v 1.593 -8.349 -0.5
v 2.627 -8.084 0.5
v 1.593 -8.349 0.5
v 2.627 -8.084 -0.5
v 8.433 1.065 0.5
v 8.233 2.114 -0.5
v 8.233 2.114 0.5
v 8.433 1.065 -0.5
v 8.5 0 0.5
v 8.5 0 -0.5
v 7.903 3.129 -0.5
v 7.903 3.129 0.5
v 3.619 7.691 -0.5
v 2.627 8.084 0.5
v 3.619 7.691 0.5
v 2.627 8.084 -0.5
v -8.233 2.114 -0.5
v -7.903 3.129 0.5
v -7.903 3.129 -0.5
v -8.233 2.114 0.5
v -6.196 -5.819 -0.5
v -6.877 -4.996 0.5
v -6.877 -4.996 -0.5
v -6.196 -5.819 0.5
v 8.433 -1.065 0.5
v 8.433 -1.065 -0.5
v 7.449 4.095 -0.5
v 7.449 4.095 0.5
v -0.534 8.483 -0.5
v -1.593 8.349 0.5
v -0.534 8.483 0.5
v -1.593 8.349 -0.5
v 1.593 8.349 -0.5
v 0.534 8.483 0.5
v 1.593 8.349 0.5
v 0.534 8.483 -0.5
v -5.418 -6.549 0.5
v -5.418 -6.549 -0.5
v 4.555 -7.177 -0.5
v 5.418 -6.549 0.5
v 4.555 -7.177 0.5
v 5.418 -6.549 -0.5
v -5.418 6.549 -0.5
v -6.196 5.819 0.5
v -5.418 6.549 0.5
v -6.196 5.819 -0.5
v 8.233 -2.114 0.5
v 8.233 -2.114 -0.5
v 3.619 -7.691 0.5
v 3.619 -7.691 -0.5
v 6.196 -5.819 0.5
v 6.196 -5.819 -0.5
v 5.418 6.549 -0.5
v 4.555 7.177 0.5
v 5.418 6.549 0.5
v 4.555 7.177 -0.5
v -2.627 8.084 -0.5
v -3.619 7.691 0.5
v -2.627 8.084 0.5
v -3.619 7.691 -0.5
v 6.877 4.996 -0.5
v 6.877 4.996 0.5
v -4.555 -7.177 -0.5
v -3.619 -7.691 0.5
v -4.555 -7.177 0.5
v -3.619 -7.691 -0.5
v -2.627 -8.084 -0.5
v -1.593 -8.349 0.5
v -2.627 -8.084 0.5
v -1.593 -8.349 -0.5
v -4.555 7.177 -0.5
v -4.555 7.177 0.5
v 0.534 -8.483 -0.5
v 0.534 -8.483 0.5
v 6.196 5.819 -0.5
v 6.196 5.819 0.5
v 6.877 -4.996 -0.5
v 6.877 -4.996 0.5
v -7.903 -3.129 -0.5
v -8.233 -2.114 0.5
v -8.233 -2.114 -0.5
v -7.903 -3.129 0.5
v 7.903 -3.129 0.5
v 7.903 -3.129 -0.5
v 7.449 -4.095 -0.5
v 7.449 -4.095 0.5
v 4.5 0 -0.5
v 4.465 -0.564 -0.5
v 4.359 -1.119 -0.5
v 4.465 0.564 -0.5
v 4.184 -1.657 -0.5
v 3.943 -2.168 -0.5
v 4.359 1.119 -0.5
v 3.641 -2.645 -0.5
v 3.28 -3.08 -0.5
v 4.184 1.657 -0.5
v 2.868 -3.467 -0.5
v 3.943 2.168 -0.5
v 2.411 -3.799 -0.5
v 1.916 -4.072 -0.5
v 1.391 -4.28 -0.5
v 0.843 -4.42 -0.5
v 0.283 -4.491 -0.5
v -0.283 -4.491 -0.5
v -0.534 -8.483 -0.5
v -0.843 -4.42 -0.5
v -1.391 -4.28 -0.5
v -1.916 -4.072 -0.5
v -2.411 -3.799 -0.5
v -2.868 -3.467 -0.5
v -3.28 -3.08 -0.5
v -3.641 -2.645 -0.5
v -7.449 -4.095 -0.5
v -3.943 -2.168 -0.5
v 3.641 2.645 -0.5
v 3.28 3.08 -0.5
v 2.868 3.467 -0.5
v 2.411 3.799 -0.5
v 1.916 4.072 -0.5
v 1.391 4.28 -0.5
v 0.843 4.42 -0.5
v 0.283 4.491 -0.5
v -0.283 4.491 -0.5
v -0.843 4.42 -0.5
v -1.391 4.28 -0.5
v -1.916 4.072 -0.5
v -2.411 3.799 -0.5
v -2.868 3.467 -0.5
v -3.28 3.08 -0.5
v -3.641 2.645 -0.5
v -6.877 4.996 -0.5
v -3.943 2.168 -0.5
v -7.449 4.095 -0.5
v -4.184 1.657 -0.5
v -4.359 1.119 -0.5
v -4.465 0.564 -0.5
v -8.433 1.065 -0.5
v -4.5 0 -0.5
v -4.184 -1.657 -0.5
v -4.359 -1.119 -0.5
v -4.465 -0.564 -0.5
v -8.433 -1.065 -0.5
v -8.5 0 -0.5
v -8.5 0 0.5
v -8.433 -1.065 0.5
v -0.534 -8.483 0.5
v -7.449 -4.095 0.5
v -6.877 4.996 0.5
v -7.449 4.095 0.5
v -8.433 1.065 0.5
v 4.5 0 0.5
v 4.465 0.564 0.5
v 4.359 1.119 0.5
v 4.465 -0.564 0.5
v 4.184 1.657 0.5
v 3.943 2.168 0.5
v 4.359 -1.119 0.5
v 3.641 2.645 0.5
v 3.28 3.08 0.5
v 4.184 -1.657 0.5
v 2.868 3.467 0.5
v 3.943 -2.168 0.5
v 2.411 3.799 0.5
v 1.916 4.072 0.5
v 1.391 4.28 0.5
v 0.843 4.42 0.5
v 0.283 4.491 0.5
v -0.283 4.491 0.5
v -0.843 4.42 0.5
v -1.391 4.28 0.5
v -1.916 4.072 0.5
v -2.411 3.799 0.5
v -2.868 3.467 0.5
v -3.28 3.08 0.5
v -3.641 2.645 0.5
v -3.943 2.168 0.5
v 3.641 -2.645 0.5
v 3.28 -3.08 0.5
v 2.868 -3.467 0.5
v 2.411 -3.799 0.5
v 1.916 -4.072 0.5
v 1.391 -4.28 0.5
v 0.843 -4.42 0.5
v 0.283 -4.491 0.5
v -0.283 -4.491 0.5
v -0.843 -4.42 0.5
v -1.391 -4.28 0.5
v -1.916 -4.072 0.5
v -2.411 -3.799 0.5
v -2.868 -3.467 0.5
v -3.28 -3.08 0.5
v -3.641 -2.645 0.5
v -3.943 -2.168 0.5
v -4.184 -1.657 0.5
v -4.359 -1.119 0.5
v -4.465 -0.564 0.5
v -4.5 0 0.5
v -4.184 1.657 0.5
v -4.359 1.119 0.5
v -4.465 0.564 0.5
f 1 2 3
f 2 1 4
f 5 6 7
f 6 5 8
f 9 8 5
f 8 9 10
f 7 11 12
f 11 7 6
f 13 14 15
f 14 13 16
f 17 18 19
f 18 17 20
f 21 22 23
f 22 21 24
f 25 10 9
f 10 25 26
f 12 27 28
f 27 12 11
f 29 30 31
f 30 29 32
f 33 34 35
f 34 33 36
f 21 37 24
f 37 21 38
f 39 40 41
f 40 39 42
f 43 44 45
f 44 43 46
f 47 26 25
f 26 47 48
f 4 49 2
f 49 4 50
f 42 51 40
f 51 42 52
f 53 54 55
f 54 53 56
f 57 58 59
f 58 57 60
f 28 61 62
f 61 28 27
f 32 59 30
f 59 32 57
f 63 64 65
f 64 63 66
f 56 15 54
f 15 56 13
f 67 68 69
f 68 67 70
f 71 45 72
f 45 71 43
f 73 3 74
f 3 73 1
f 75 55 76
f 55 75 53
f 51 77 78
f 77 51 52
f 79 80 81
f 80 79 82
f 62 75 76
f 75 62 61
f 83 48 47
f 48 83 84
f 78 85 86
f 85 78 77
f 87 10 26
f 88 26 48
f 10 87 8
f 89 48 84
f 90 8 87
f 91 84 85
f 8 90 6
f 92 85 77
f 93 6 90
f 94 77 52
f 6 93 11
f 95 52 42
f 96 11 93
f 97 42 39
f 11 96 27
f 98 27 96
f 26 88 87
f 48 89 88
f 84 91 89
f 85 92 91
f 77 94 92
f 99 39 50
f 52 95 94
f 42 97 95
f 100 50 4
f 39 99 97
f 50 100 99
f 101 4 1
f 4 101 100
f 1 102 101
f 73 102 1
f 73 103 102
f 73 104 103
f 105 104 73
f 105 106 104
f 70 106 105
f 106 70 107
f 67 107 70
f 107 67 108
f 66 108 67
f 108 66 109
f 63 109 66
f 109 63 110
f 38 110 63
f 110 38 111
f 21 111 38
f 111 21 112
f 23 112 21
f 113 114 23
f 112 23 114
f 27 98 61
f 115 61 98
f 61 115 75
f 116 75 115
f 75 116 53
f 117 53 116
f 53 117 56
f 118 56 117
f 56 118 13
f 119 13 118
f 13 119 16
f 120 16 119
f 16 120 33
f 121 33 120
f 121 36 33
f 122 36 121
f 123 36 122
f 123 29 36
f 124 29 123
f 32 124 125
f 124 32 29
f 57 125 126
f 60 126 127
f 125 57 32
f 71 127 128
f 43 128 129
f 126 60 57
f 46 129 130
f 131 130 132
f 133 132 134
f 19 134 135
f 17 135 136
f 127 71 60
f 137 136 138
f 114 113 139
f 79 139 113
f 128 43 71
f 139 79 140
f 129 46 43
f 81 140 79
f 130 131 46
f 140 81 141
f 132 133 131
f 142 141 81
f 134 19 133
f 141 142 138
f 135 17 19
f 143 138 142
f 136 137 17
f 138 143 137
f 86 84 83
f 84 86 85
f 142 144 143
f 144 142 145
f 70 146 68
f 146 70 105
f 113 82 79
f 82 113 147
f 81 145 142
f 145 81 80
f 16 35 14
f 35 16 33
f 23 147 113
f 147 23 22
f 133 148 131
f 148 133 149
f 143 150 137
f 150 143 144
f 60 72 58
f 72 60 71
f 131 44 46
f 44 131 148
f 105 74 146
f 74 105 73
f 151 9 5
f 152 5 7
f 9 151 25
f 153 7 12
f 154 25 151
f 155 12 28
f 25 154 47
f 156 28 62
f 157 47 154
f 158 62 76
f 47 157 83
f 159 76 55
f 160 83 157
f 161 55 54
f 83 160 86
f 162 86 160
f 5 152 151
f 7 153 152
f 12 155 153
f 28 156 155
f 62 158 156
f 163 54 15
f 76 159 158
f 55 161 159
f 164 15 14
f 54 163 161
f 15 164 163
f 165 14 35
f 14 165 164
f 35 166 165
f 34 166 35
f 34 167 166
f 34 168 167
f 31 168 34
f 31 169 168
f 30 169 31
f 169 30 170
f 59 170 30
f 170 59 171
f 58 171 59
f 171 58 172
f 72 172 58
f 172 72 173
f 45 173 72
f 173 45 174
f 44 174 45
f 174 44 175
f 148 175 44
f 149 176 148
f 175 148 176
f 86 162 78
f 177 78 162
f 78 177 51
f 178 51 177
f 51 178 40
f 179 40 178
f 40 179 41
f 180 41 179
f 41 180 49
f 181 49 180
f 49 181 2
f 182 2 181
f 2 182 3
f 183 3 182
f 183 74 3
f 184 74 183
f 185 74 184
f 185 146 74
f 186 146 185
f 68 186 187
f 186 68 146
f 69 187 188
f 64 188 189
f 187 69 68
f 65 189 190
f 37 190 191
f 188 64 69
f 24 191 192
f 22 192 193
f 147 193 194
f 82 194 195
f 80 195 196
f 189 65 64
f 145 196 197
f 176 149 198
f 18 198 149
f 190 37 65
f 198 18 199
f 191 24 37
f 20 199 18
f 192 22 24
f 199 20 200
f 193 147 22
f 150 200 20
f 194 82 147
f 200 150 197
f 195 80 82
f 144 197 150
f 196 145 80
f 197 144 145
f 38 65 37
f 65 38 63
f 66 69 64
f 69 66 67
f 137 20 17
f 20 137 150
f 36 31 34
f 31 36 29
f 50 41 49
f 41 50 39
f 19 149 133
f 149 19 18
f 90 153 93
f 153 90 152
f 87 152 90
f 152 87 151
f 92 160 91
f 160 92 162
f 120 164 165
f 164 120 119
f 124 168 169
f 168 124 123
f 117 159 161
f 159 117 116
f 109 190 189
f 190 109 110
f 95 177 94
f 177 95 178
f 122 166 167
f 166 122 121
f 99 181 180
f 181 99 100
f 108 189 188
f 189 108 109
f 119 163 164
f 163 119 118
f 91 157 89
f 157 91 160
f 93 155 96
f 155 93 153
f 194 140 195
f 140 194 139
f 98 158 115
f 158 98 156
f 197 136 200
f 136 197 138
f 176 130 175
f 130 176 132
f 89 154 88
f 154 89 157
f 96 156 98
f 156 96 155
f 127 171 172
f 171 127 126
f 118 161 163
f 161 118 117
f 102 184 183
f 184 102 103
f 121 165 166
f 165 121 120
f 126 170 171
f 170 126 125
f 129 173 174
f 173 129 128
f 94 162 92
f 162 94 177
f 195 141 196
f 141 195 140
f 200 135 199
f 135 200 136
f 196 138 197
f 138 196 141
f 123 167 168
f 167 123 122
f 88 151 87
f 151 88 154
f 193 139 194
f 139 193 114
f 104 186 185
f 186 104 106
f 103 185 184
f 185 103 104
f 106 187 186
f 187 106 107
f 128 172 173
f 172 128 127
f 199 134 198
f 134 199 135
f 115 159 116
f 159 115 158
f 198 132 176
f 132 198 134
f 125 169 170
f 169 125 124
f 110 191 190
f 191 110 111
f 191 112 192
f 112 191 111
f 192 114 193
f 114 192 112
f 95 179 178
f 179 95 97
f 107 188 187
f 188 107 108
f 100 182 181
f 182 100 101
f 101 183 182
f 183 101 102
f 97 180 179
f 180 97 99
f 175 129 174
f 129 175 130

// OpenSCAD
$fn = 50;


difference() {
	union() {
		translate(v = [0, 0, -0.5000000000]) {
			cylinder(h = 1, r = 8.5000000000);
		}
	}
	union() {
		translate(v = [0, 0, -100.0000000000]) {
			cylinder(h = 200, r = 4.5000000000);
		}
	}
}
